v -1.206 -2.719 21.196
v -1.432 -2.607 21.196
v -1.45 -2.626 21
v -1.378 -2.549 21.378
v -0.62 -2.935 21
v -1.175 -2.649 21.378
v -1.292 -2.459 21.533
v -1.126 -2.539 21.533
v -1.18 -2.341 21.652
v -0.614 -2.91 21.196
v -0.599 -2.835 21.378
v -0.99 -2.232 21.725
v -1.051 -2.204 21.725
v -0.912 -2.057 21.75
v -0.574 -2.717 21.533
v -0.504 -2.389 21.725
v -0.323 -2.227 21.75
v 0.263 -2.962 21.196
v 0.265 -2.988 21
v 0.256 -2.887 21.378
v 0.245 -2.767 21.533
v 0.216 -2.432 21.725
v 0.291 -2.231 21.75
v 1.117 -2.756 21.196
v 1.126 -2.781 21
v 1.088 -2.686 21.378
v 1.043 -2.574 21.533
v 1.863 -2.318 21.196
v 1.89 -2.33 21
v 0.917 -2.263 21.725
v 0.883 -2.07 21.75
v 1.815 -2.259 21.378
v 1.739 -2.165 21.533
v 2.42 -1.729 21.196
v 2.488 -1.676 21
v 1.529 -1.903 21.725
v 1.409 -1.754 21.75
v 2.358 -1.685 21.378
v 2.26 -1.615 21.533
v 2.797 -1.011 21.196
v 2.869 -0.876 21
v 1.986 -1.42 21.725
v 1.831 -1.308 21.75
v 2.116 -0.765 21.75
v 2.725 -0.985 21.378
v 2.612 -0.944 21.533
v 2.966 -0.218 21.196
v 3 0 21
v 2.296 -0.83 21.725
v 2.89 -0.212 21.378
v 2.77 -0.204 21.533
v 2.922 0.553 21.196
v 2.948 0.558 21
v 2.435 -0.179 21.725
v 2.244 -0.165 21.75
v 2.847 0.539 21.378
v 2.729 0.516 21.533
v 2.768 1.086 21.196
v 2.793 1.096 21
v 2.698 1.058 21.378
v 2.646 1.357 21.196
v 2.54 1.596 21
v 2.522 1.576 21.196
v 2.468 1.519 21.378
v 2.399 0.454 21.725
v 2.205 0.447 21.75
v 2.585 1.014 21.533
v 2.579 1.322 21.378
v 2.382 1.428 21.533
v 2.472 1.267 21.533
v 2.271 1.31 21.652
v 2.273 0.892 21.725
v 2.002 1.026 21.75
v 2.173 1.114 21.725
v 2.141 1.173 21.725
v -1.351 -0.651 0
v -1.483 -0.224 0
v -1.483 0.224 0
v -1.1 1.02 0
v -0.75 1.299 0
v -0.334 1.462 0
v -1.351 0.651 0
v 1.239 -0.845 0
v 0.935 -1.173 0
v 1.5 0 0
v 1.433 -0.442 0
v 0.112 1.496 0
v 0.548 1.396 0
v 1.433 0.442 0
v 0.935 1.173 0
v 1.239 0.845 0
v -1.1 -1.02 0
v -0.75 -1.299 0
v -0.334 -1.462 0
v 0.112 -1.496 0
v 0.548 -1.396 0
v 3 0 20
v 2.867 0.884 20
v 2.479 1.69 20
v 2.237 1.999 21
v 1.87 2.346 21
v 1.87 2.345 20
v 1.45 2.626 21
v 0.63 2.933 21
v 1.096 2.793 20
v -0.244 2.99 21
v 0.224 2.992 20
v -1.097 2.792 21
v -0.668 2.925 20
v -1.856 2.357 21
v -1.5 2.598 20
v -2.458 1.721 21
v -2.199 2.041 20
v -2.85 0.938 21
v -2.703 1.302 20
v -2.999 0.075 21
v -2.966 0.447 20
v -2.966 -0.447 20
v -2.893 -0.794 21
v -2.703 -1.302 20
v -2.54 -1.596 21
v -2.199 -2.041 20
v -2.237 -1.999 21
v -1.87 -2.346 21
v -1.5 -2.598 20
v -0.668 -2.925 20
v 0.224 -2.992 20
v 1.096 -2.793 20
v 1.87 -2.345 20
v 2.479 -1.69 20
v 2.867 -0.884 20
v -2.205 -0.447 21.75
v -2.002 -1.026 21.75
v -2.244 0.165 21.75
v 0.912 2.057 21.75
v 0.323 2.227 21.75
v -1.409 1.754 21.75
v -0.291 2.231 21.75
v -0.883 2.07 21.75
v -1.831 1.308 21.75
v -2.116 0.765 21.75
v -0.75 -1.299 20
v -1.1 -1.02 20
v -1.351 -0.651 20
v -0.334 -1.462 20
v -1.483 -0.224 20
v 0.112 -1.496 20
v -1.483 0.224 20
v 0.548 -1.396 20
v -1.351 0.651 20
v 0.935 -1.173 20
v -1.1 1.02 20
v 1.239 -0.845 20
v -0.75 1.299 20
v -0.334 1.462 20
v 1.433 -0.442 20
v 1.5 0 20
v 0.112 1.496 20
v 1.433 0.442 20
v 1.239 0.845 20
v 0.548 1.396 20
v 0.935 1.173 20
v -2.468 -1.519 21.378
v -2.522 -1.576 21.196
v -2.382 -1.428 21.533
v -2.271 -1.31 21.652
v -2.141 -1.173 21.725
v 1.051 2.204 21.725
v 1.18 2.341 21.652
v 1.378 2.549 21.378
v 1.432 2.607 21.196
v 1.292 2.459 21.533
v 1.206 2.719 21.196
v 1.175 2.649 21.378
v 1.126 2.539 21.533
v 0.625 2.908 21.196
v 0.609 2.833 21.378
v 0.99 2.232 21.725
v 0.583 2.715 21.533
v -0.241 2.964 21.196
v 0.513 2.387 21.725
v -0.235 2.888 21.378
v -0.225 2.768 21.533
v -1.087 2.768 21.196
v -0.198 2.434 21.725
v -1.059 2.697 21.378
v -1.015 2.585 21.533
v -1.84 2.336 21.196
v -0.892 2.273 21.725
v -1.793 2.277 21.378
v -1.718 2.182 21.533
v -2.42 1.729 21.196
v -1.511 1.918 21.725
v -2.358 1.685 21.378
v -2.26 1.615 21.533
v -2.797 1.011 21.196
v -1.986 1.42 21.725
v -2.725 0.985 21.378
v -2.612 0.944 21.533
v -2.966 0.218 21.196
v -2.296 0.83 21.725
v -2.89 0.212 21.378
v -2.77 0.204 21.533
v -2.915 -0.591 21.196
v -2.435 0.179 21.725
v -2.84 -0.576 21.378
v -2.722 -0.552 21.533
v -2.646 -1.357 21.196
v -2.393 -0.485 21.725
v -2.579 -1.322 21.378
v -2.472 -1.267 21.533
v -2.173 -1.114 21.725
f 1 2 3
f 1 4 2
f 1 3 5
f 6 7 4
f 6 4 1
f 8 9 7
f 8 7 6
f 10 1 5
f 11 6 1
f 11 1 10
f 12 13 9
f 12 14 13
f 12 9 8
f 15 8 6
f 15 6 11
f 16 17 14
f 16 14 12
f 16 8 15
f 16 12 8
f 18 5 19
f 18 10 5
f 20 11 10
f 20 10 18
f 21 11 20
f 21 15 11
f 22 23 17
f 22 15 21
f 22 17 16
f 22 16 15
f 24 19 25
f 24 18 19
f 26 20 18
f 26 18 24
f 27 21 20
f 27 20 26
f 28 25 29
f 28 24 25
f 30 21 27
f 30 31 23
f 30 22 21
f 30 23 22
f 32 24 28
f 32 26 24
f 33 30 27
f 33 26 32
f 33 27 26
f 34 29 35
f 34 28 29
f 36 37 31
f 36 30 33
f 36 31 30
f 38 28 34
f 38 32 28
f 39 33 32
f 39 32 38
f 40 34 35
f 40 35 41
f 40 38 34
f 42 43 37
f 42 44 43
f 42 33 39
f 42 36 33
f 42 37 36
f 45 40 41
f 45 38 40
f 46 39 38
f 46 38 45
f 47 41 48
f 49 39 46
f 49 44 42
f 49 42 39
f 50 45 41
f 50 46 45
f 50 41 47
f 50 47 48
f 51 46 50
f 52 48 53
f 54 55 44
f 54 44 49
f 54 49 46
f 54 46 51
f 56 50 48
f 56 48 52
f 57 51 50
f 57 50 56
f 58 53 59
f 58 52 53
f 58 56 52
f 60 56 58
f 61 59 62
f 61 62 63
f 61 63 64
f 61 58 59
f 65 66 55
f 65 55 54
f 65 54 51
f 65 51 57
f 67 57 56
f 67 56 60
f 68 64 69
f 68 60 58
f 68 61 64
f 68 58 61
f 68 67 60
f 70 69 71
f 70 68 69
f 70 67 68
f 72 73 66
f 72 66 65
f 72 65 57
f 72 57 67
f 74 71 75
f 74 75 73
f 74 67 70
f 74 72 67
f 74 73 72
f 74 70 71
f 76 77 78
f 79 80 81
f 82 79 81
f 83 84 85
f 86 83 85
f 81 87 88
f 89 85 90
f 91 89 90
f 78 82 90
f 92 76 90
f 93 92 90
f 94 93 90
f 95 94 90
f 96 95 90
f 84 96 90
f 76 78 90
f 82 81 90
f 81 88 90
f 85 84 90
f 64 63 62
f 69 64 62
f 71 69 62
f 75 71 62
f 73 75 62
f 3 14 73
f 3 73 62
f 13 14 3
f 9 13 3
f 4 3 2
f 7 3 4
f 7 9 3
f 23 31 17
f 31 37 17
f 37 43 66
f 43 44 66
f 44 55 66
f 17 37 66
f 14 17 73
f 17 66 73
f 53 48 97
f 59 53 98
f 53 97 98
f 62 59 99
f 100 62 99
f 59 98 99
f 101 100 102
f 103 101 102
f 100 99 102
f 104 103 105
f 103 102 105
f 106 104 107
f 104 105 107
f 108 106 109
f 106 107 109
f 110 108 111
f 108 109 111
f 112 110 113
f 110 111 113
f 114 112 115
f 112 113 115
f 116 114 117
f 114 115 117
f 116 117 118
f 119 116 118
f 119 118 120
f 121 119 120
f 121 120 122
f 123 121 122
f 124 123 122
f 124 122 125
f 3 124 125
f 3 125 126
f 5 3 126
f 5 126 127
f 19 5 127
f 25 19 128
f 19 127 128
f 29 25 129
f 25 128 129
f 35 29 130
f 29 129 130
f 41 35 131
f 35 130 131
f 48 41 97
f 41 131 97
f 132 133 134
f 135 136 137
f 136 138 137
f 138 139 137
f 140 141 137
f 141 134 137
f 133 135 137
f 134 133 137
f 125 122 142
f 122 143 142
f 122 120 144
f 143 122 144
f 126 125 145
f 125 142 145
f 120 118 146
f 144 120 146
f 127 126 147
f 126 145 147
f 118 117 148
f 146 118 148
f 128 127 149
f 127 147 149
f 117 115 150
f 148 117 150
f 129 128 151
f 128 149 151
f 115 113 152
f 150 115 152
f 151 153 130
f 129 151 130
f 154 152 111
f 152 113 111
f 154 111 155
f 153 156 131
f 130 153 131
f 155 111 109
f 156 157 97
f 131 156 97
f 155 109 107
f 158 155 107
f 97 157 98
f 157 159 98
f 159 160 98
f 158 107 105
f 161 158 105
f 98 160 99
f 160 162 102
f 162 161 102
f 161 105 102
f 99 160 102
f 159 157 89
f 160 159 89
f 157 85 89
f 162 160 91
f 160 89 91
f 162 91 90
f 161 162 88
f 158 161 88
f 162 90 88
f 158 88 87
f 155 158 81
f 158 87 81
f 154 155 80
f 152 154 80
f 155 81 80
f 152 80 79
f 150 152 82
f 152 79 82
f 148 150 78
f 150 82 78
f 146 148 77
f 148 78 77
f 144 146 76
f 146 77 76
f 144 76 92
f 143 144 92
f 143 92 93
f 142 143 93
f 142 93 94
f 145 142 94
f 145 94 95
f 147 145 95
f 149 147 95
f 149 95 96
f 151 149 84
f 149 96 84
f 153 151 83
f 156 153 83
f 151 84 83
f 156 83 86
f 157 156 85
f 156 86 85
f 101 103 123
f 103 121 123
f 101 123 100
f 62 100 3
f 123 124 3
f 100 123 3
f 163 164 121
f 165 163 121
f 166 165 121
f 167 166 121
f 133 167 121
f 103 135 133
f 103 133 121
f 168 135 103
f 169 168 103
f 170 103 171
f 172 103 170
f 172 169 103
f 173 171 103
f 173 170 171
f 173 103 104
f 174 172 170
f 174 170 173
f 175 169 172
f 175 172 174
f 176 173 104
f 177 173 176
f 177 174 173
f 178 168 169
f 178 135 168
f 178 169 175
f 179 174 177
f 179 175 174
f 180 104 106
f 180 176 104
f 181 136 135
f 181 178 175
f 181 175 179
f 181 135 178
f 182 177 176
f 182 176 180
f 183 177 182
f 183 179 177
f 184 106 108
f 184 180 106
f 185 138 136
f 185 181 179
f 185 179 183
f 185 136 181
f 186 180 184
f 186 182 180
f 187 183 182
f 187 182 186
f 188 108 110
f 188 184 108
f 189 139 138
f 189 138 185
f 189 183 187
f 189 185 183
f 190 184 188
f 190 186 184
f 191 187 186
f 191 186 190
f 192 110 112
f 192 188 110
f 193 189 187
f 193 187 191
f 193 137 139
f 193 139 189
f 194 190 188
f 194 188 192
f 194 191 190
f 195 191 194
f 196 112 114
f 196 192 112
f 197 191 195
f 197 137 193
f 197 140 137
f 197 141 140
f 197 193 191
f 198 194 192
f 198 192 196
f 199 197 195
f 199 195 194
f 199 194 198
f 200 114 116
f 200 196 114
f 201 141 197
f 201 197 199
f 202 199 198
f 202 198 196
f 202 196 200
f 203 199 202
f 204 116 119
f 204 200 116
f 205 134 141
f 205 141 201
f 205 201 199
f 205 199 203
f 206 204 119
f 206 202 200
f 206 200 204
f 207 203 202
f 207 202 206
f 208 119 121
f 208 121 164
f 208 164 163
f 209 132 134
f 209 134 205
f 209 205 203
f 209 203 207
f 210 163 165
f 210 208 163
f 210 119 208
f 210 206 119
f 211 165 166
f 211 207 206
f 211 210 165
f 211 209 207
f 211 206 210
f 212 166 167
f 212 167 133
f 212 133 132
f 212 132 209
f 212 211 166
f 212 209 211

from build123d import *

# Parameters (mm, degrees)
POCKET_DEPTH = 0.75


with BuildPart() as part:
    # Sketch → Revolution (revolve)
    with BuildSketch(Plane.XZ):
        with BuildLine():
            Line((0, 0), (0, 21.75))
            Line((0, 21.75), (2.25, 21.75))
            ThreePointArc((3, 21), (2.78033, 21.53033), (2.25, 21.75))
            Line((3, 21), (3, 20))
            Line((3, 20), (1.5, 20))
            Line((1.5, 20), (1.5, 0))
            Line((1.5, 0), (0, 0))
        make_face()
    revolve(axis=Axis((0, 0, 0), (0, 0, 1)))

    # Sketch001 (on Face5 of Revolution) → Pocket (cut)
    with BuildSketch(Plane(origin=(0, 0, 21.75), x_dir=(-1, 0, 0), z_dir=(0, 0, 1))):
        Polygon((-3.274783, -2.372712), (2.184691, 3.4031), (3.274783, 2.372712), (-2.184691, -3.4031), align=None)
    extrude(amount=-POCKET_DEPTH, mode=Mode.SUBTRACT)


solid = part.part
